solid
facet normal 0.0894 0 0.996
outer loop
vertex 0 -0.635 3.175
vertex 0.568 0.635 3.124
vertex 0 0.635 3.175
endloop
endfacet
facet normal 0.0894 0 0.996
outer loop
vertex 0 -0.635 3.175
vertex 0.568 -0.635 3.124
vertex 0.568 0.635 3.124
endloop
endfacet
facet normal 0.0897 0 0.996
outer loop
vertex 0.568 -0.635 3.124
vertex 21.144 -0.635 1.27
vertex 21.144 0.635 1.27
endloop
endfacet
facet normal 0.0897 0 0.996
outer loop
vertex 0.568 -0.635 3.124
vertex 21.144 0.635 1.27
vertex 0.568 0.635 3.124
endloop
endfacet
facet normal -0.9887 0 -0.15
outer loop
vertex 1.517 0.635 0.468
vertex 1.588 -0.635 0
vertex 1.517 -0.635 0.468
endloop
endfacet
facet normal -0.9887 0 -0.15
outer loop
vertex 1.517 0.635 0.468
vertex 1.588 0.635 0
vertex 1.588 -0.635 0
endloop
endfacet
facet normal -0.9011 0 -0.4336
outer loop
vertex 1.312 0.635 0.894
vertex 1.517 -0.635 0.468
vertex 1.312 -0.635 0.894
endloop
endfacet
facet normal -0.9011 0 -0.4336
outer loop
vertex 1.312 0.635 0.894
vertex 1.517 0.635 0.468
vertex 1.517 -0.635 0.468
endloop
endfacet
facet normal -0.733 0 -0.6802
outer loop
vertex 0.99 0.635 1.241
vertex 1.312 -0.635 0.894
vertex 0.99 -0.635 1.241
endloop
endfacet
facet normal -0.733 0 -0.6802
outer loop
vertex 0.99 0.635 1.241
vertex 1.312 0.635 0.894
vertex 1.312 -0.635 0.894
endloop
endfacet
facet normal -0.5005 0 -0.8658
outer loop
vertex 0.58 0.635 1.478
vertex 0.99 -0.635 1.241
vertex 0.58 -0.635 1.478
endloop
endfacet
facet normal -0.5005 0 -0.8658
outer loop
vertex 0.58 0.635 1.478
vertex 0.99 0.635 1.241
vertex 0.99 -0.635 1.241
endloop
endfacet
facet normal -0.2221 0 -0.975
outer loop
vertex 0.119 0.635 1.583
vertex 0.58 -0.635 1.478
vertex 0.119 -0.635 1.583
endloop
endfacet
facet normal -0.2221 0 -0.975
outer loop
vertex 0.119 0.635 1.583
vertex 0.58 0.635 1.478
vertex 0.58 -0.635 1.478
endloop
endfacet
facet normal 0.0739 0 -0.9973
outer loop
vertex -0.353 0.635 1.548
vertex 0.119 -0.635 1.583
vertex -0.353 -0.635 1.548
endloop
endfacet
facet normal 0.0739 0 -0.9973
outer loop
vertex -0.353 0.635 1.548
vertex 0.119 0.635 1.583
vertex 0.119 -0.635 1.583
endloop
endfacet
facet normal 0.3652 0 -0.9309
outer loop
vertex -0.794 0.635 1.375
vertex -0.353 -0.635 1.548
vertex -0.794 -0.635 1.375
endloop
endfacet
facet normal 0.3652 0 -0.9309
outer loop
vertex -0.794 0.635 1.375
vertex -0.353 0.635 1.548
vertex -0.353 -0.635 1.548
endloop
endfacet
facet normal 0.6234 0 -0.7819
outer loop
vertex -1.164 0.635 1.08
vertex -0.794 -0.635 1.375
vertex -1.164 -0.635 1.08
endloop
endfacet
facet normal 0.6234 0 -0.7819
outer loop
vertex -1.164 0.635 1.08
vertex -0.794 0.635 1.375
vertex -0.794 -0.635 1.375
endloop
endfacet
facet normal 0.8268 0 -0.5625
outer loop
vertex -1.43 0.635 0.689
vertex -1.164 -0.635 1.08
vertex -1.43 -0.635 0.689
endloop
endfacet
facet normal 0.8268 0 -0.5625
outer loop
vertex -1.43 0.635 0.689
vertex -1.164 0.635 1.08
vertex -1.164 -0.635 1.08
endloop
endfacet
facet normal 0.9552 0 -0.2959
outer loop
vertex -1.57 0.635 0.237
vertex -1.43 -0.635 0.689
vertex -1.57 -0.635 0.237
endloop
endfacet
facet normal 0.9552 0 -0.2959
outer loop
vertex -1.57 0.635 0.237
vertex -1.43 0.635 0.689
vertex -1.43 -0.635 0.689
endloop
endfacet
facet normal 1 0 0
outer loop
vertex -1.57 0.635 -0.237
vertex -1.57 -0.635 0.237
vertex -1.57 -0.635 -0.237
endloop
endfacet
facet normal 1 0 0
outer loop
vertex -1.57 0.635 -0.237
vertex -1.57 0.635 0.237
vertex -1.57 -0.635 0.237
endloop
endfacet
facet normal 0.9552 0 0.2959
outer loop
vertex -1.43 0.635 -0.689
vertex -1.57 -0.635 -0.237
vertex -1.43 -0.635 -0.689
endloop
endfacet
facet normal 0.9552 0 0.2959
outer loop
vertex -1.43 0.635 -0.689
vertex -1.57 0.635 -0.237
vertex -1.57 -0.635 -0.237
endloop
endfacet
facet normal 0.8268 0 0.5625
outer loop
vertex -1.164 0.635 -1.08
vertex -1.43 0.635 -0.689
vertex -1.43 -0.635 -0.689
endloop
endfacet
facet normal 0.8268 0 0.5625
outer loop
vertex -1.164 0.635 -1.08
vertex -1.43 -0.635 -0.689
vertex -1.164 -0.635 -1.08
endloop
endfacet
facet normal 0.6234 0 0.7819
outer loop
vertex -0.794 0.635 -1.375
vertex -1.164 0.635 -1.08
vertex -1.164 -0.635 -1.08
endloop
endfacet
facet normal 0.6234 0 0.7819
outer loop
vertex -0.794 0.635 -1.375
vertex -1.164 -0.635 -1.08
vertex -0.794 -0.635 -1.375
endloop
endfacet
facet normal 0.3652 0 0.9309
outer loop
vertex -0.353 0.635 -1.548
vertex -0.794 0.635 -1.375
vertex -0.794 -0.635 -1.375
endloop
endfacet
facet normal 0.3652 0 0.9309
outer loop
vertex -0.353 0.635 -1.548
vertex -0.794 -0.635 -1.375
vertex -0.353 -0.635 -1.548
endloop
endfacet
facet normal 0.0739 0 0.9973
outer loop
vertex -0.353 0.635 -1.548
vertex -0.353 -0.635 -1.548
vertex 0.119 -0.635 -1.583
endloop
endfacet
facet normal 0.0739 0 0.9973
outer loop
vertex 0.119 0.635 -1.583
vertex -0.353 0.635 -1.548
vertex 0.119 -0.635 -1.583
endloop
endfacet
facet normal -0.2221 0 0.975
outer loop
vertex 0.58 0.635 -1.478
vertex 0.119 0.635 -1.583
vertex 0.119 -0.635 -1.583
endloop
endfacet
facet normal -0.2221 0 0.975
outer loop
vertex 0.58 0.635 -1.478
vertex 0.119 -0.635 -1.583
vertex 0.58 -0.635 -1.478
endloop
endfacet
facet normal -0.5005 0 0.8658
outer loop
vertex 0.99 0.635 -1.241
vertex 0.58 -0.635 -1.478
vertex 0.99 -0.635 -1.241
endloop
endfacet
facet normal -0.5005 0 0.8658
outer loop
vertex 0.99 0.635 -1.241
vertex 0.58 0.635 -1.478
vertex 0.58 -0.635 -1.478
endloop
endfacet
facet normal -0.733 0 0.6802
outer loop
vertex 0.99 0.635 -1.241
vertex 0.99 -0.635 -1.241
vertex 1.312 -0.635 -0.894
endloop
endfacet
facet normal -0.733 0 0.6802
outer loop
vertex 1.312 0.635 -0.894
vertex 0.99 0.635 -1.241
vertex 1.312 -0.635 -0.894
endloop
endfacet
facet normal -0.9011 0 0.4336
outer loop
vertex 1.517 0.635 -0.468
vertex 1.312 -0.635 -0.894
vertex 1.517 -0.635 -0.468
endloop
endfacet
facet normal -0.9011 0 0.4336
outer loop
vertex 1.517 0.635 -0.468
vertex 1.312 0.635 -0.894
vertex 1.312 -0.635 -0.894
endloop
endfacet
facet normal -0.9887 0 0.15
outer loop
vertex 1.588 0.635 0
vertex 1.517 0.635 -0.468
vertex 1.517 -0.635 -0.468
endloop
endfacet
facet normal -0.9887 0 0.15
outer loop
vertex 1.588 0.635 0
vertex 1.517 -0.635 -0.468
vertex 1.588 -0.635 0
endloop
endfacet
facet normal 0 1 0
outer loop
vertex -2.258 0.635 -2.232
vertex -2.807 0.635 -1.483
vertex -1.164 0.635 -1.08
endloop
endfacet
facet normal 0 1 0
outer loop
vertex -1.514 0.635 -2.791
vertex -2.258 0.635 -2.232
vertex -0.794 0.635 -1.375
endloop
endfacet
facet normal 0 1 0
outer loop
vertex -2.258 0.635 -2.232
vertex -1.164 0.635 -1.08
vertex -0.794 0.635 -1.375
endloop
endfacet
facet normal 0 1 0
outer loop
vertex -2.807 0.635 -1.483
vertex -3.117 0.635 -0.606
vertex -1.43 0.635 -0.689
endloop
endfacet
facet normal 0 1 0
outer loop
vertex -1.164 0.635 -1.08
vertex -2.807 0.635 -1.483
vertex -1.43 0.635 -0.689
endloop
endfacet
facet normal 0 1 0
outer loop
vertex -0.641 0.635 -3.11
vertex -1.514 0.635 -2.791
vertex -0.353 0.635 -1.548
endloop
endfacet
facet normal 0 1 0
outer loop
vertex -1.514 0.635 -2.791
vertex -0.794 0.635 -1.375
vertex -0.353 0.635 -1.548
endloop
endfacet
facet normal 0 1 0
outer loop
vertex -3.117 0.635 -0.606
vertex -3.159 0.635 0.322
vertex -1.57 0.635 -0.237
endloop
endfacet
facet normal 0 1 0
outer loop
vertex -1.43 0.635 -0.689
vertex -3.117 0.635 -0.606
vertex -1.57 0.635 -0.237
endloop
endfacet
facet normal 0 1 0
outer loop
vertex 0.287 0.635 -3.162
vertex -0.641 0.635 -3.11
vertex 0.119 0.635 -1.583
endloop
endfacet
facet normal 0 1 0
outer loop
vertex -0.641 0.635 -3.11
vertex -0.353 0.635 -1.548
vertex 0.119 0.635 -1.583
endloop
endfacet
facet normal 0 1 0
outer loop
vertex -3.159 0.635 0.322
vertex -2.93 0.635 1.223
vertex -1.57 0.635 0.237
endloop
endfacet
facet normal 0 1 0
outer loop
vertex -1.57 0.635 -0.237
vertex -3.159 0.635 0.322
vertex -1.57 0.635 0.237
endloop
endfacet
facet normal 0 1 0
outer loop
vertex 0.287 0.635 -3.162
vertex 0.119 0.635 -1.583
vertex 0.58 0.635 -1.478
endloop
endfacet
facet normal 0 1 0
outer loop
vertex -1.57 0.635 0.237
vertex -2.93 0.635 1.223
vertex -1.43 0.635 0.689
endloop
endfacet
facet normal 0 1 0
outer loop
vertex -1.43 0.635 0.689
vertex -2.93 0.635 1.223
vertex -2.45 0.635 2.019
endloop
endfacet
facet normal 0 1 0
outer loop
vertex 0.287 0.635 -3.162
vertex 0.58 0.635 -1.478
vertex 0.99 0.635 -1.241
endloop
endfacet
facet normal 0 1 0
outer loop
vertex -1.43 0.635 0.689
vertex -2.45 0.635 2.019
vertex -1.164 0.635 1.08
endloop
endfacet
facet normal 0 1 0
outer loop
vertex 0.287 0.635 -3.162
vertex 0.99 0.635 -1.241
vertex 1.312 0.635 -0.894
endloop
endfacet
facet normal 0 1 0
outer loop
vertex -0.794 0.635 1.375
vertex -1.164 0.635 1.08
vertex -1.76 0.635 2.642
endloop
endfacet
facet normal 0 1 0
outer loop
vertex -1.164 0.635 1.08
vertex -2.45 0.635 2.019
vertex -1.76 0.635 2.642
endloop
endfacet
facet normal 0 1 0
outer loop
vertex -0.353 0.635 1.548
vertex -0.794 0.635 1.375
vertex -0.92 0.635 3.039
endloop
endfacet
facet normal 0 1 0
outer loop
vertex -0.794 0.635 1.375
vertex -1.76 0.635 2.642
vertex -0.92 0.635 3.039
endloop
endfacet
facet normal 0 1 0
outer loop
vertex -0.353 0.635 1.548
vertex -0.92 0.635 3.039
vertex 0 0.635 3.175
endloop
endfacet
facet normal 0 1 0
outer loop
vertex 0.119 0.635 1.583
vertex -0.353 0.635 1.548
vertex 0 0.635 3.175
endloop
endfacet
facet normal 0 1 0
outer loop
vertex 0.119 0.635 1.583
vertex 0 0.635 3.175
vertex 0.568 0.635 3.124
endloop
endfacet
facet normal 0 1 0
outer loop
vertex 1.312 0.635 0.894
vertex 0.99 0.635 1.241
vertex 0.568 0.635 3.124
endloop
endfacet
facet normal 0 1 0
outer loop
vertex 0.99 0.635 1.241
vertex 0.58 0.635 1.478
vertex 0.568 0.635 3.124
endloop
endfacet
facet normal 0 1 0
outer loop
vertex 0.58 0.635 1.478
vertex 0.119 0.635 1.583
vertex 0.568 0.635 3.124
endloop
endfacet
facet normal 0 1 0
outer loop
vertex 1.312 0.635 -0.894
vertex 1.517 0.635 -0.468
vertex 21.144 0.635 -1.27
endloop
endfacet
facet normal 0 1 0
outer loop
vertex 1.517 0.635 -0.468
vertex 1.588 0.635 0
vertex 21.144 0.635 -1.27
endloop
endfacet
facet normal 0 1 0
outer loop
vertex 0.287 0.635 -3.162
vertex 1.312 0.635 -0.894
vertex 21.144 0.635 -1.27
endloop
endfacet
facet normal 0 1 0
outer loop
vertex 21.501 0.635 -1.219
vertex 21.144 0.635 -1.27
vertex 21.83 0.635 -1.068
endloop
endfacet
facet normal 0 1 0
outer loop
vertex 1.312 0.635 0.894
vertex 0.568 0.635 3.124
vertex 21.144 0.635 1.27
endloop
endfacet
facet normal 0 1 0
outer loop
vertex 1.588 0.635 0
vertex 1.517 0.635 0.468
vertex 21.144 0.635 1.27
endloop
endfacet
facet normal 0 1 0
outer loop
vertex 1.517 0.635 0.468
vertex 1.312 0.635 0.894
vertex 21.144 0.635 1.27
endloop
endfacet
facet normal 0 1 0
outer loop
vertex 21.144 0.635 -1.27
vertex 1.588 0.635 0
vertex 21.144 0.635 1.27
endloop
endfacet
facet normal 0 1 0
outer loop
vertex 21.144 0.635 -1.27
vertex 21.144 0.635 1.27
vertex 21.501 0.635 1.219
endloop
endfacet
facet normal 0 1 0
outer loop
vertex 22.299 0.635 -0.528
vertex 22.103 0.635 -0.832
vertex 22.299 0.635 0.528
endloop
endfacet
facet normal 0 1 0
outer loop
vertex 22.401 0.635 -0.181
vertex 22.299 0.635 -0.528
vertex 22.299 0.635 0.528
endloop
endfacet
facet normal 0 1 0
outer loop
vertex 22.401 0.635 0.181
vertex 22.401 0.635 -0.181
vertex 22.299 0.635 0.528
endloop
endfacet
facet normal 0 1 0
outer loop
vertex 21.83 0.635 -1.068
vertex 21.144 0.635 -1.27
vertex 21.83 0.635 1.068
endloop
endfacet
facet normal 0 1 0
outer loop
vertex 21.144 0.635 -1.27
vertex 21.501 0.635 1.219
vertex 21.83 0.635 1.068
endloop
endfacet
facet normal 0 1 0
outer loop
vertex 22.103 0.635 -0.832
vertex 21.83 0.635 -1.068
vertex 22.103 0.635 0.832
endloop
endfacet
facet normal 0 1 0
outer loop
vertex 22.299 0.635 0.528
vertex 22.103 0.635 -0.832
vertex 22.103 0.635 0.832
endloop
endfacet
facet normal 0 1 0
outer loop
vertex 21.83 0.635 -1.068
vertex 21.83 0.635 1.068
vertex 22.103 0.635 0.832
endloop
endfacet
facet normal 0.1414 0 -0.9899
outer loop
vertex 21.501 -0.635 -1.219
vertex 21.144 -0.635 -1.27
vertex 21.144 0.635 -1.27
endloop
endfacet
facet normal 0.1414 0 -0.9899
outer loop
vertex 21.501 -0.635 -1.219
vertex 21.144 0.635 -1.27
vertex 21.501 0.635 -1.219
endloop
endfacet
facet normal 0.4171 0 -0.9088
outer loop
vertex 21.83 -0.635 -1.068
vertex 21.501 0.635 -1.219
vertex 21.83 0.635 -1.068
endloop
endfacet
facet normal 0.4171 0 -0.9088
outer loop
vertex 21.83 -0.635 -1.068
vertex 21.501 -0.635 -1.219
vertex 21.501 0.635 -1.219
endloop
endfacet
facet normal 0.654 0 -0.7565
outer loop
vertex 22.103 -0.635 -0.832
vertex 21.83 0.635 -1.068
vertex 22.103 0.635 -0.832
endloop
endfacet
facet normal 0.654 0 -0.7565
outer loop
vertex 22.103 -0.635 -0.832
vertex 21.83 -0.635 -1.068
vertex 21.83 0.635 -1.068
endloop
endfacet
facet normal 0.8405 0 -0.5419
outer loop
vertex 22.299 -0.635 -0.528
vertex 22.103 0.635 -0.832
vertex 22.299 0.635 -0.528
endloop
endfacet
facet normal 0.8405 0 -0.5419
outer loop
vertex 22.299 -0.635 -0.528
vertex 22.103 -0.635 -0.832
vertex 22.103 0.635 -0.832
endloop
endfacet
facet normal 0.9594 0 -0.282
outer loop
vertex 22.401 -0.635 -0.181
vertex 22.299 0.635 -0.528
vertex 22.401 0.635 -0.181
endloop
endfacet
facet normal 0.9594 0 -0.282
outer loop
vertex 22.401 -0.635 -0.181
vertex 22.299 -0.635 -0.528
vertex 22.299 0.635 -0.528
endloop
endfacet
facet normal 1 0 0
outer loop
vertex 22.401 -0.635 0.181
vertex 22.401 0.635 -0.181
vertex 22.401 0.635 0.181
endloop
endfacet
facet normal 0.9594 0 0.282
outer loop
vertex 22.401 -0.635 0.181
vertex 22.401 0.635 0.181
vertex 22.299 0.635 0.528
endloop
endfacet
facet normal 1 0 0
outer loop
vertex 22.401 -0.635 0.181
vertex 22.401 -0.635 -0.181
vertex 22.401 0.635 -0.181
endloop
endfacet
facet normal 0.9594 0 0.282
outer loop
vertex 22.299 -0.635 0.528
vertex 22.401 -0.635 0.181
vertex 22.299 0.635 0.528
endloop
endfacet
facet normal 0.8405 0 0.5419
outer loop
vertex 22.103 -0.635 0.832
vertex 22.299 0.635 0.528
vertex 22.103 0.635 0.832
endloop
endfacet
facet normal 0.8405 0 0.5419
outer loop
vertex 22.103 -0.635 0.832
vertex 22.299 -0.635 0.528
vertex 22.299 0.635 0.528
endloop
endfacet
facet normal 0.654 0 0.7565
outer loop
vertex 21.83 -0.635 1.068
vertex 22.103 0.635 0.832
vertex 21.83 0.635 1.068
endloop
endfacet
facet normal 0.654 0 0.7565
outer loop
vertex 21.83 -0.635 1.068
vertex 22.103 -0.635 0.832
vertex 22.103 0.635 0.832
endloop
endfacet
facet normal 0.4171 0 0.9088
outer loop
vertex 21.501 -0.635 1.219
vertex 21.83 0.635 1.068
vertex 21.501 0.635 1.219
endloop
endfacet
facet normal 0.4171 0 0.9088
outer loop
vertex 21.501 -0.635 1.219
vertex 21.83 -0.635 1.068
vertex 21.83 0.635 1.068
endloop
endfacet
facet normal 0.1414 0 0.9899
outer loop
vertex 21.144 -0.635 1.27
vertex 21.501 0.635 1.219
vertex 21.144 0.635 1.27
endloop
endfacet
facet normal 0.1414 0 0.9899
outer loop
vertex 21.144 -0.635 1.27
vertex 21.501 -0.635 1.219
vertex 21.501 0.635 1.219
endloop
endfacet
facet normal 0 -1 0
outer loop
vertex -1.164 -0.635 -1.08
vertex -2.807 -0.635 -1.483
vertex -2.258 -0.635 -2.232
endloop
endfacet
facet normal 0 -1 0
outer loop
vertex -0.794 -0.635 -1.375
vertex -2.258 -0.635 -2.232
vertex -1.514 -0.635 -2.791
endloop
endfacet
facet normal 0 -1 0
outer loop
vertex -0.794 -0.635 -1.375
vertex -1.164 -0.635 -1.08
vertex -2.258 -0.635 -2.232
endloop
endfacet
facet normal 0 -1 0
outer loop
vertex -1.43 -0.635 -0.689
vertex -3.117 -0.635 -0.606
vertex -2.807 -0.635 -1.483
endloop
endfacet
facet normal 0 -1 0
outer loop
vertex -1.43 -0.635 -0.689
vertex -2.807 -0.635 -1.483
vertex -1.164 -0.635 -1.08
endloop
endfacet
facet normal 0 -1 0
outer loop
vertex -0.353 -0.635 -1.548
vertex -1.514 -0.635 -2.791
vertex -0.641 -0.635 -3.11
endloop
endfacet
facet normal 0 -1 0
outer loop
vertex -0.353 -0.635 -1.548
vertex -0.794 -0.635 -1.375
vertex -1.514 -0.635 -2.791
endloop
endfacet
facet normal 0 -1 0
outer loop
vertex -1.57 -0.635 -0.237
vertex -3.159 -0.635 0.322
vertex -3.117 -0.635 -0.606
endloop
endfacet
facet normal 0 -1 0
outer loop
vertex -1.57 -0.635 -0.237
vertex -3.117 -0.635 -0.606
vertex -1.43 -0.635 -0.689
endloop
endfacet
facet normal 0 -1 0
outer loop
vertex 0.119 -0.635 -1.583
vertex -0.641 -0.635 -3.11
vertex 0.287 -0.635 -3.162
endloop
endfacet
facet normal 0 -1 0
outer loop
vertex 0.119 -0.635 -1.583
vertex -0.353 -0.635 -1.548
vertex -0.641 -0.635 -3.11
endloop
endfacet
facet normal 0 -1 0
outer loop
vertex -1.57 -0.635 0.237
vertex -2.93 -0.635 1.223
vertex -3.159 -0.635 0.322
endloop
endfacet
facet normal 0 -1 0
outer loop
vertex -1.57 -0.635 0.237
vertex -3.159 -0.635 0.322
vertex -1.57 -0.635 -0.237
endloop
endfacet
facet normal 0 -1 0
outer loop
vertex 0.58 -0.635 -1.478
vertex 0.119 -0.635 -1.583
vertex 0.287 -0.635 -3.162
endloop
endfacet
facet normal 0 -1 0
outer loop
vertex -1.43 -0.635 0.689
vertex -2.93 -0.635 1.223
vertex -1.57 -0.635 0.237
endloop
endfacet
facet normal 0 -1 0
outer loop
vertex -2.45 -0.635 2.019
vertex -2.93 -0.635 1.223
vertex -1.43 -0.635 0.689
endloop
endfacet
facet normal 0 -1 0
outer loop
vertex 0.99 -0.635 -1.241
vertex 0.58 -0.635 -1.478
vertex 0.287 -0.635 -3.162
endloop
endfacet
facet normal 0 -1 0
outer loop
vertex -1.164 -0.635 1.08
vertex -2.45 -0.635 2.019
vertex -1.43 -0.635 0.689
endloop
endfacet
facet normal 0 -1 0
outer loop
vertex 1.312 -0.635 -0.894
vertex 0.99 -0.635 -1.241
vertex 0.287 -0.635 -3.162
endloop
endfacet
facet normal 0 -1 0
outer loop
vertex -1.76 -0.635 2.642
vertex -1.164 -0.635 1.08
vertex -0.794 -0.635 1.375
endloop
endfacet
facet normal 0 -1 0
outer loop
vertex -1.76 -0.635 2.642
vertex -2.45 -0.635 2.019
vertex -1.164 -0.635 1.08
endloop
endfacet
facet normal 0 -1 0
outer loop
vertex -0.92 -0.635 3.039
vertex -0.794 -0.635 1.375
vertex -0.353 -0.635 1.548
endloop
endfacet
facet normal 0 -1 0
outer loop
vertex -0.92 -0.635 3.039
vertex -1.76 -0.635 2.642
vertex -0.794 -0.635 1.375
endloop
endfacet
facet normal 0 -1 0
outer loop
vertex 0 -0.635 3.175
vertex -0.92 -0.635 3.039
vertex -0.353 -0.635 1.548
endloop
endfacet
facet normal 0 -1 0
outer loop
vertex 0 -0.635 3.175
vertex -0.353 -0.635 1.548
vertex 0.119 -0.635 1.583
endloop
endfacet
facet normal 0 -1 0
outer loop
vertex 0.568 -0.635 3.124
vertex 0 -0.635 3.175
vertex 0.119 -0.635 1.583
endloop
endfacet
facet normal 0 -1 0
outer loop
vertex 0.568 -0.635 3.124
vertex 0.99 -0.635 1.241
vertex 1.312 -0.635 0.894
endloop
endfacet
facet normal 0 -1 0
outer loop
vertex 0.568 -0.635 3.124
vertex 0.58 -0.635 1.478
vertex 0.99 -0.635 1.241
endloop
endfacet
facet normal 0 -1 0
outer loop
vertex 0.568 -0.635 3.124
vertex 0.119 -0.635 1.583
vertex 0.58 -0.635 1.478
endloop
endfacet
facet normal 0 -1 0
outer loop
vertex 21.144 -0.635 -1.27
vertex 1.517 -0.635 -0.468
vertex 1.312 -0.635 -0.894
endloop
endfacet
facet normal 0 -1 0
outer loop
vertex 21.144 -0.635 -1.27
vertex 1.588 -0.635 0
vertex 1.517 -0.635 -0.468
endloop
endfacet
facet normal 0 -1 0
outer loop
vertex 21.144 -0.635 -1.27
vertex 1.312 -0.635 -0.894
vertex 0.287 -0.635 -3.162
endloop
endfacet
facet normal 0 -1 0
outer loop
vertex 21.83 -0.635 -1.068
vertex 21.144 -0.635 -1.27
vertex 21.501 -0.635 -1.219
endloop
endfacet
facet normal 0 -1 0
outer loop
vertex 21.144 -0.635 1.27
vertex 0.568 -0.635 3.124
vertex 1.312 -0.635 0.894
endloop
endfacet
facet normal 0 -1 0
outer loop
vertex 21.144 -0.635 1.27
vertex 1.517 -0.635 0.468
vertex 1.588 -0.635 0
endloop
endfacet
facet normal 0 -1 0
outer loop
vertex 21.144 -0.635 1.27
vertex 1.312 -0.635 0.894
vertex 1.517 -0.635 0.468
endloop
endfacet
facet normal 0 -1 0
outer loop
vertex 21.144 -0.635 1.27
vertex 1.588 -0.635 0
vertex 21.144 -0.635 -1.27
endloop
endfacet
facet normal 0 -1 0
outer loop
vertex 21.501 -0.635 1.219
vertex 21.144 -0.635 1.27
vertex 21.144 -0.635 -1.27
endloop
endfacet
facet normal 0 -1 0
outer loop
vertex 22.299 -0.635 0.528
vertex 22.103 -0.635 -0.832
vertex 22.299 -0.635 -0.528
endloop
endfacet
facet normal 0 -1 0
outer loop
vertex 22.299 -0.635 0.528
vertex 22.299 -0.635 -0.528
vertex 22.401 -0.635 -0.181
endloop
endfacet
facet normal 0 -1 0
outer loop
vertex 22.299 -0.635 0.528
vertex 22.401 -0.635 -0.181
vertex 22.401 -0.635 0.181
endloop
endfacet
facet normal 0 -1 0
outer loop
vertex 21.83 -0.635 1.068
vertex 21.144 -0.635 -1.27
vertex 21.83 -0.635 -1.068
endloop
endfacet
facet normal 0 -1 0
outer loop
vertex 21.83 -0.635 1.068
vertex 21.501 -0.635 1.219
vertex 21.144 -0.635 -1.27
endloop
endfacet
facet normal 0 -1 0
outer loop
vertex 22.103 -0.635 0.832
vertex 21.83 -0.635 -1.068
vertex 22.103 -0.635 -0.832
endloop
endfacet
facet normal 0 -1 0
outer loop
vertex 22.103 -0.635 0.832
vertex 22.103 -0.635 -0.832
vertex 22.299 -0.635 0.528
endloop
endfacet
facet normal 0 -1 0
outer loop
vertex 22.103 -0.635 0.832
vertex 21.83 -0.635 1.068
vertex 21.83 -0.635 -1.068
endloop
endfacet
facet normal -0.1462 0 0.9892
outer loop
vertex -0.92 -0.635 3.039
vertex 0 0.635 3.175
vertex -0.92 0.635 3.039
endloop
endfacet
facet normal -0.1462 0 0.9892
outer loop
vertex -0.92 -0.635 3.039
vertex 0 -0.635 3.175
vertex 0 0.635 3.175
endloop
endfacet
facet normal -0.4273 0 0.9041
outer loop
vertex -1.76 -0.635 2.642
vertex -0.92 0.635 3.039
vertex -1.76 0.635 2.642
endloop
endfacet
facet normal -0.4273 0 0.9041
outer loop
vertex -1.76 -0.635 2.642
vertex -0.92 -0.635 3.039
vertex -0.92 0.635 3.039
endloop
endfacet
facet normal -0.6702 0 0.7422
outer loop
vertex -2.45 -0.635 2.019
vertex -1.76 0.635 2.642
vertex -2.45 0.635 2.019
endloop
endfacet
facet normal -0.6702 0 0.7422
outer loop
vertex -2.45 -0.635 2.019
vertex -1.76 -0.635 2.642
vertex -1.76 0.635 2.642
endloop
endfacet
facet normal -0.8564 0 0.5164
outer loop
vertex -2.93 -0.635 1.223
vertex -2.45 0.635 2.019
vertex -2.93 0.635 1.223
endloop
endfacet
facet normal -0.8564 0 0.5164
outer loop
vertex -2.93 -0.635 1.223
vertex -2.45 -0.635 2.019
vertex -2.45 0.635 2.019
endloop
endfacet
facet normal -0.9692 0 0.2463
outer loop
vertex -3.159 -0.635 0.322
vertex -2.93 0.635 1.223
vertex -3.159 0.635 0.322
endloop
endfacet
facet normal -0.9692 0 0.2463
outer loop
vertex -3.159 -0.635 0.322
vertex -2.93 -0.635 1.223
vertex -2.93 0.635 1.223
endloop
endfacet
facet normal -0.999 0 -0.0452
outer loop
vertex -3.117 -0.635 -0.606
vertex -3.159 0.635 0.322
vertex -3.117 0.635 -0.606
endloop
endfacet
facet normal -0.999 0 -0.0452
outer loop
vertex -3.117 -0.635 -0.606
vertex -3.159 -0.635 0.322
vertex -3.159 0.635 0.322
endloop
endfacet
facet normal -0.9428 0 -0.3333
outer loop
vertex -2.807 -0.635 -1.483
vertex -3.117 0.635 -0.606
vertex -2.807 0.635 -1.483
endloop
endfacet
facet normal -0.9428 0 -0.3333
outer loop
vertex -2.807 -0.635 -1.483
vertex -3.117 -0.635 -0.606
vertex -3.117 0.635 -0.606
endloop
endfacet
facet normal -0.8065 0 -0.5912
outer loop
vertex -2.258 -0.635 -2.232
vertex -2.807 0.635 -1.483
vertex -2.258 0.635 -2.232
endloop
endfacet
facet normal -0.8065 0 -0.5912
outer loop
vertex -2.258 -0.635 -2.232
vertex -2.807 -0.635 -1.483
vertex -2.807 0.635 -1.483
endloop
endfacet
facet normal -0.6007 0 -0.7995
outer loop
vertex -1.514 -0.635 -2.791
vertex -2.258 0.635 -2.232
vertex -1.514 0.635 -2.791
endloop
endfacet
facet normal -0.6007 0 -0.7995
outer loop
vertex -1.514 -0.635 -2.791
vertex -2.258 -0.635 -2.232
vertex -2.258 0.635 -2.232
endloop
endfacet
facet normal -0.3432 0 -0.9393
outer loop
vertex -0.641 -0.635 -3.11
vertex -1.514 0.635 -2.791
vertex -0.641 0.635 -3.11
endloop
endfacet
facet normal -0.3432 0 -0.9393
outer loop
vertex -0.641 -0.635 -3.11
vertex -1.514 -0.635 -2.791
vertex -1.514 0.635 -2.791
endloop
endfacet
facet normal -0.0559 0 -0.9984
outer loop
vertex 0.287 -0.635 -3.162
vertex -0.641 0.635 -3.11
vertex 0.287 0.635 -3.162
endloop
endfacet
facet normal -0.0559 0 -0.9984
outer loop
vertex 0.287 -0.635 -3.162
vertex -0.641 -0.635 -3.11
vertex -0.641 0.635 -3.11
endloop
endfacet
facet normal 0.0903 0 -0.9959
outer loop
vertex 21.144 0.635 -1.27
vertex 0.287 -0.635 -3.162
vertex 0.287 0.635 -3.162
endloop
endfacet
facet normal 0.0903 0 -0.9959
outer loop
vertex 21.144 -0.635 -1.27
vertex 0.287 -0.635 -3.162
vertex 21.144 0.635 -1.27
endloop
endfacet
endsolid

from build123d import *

# Parameters (mm, degrees)
F0_R     = 1.5875
F1_DEPTH = 0.635


with BuildPart() as f1:
    # F0 (on Front) → F1 (new body, symmetric)
    with BuildSketch(Plane.XZ):
        with BuildLine():
            ThreePointArc((0.567515, 3.123868), (2.437467, 2.034547), (3.175, 0))
            ThreePointArc((3.175, 0), (2.344285, -2.14125), (0.286841, -3.162016))
            Line((0.286841, -3.162016), (21.143647, -1.27))
            ThreePointArc((21.143647, -1.27), (22.413647, 0), (21.143647, 1.27))
            Line((21.143647, 1.27), (0.567515, 3.123868))
        make_face()
        with BuildLine():
            ThreePointArc((0.286841, -3.162016), (2.344285, -2.14125), (3.175, 0))
            ThreePointArc((3.175, 0), (2.437467, 2.034547), (0.567515, 3.123868))
            Line((0.567515, 3.123868), (0, 3.175))
            ThreePointArc((0, 3.175), (-3.171752, -0.143567), (0.286841, -3.162016))
        make_face()
        Circle(F0_R, mode=Mode.SUBTRACT)
    extrude(amount=F1_DEPTH, both=True)


solid = f1.part
